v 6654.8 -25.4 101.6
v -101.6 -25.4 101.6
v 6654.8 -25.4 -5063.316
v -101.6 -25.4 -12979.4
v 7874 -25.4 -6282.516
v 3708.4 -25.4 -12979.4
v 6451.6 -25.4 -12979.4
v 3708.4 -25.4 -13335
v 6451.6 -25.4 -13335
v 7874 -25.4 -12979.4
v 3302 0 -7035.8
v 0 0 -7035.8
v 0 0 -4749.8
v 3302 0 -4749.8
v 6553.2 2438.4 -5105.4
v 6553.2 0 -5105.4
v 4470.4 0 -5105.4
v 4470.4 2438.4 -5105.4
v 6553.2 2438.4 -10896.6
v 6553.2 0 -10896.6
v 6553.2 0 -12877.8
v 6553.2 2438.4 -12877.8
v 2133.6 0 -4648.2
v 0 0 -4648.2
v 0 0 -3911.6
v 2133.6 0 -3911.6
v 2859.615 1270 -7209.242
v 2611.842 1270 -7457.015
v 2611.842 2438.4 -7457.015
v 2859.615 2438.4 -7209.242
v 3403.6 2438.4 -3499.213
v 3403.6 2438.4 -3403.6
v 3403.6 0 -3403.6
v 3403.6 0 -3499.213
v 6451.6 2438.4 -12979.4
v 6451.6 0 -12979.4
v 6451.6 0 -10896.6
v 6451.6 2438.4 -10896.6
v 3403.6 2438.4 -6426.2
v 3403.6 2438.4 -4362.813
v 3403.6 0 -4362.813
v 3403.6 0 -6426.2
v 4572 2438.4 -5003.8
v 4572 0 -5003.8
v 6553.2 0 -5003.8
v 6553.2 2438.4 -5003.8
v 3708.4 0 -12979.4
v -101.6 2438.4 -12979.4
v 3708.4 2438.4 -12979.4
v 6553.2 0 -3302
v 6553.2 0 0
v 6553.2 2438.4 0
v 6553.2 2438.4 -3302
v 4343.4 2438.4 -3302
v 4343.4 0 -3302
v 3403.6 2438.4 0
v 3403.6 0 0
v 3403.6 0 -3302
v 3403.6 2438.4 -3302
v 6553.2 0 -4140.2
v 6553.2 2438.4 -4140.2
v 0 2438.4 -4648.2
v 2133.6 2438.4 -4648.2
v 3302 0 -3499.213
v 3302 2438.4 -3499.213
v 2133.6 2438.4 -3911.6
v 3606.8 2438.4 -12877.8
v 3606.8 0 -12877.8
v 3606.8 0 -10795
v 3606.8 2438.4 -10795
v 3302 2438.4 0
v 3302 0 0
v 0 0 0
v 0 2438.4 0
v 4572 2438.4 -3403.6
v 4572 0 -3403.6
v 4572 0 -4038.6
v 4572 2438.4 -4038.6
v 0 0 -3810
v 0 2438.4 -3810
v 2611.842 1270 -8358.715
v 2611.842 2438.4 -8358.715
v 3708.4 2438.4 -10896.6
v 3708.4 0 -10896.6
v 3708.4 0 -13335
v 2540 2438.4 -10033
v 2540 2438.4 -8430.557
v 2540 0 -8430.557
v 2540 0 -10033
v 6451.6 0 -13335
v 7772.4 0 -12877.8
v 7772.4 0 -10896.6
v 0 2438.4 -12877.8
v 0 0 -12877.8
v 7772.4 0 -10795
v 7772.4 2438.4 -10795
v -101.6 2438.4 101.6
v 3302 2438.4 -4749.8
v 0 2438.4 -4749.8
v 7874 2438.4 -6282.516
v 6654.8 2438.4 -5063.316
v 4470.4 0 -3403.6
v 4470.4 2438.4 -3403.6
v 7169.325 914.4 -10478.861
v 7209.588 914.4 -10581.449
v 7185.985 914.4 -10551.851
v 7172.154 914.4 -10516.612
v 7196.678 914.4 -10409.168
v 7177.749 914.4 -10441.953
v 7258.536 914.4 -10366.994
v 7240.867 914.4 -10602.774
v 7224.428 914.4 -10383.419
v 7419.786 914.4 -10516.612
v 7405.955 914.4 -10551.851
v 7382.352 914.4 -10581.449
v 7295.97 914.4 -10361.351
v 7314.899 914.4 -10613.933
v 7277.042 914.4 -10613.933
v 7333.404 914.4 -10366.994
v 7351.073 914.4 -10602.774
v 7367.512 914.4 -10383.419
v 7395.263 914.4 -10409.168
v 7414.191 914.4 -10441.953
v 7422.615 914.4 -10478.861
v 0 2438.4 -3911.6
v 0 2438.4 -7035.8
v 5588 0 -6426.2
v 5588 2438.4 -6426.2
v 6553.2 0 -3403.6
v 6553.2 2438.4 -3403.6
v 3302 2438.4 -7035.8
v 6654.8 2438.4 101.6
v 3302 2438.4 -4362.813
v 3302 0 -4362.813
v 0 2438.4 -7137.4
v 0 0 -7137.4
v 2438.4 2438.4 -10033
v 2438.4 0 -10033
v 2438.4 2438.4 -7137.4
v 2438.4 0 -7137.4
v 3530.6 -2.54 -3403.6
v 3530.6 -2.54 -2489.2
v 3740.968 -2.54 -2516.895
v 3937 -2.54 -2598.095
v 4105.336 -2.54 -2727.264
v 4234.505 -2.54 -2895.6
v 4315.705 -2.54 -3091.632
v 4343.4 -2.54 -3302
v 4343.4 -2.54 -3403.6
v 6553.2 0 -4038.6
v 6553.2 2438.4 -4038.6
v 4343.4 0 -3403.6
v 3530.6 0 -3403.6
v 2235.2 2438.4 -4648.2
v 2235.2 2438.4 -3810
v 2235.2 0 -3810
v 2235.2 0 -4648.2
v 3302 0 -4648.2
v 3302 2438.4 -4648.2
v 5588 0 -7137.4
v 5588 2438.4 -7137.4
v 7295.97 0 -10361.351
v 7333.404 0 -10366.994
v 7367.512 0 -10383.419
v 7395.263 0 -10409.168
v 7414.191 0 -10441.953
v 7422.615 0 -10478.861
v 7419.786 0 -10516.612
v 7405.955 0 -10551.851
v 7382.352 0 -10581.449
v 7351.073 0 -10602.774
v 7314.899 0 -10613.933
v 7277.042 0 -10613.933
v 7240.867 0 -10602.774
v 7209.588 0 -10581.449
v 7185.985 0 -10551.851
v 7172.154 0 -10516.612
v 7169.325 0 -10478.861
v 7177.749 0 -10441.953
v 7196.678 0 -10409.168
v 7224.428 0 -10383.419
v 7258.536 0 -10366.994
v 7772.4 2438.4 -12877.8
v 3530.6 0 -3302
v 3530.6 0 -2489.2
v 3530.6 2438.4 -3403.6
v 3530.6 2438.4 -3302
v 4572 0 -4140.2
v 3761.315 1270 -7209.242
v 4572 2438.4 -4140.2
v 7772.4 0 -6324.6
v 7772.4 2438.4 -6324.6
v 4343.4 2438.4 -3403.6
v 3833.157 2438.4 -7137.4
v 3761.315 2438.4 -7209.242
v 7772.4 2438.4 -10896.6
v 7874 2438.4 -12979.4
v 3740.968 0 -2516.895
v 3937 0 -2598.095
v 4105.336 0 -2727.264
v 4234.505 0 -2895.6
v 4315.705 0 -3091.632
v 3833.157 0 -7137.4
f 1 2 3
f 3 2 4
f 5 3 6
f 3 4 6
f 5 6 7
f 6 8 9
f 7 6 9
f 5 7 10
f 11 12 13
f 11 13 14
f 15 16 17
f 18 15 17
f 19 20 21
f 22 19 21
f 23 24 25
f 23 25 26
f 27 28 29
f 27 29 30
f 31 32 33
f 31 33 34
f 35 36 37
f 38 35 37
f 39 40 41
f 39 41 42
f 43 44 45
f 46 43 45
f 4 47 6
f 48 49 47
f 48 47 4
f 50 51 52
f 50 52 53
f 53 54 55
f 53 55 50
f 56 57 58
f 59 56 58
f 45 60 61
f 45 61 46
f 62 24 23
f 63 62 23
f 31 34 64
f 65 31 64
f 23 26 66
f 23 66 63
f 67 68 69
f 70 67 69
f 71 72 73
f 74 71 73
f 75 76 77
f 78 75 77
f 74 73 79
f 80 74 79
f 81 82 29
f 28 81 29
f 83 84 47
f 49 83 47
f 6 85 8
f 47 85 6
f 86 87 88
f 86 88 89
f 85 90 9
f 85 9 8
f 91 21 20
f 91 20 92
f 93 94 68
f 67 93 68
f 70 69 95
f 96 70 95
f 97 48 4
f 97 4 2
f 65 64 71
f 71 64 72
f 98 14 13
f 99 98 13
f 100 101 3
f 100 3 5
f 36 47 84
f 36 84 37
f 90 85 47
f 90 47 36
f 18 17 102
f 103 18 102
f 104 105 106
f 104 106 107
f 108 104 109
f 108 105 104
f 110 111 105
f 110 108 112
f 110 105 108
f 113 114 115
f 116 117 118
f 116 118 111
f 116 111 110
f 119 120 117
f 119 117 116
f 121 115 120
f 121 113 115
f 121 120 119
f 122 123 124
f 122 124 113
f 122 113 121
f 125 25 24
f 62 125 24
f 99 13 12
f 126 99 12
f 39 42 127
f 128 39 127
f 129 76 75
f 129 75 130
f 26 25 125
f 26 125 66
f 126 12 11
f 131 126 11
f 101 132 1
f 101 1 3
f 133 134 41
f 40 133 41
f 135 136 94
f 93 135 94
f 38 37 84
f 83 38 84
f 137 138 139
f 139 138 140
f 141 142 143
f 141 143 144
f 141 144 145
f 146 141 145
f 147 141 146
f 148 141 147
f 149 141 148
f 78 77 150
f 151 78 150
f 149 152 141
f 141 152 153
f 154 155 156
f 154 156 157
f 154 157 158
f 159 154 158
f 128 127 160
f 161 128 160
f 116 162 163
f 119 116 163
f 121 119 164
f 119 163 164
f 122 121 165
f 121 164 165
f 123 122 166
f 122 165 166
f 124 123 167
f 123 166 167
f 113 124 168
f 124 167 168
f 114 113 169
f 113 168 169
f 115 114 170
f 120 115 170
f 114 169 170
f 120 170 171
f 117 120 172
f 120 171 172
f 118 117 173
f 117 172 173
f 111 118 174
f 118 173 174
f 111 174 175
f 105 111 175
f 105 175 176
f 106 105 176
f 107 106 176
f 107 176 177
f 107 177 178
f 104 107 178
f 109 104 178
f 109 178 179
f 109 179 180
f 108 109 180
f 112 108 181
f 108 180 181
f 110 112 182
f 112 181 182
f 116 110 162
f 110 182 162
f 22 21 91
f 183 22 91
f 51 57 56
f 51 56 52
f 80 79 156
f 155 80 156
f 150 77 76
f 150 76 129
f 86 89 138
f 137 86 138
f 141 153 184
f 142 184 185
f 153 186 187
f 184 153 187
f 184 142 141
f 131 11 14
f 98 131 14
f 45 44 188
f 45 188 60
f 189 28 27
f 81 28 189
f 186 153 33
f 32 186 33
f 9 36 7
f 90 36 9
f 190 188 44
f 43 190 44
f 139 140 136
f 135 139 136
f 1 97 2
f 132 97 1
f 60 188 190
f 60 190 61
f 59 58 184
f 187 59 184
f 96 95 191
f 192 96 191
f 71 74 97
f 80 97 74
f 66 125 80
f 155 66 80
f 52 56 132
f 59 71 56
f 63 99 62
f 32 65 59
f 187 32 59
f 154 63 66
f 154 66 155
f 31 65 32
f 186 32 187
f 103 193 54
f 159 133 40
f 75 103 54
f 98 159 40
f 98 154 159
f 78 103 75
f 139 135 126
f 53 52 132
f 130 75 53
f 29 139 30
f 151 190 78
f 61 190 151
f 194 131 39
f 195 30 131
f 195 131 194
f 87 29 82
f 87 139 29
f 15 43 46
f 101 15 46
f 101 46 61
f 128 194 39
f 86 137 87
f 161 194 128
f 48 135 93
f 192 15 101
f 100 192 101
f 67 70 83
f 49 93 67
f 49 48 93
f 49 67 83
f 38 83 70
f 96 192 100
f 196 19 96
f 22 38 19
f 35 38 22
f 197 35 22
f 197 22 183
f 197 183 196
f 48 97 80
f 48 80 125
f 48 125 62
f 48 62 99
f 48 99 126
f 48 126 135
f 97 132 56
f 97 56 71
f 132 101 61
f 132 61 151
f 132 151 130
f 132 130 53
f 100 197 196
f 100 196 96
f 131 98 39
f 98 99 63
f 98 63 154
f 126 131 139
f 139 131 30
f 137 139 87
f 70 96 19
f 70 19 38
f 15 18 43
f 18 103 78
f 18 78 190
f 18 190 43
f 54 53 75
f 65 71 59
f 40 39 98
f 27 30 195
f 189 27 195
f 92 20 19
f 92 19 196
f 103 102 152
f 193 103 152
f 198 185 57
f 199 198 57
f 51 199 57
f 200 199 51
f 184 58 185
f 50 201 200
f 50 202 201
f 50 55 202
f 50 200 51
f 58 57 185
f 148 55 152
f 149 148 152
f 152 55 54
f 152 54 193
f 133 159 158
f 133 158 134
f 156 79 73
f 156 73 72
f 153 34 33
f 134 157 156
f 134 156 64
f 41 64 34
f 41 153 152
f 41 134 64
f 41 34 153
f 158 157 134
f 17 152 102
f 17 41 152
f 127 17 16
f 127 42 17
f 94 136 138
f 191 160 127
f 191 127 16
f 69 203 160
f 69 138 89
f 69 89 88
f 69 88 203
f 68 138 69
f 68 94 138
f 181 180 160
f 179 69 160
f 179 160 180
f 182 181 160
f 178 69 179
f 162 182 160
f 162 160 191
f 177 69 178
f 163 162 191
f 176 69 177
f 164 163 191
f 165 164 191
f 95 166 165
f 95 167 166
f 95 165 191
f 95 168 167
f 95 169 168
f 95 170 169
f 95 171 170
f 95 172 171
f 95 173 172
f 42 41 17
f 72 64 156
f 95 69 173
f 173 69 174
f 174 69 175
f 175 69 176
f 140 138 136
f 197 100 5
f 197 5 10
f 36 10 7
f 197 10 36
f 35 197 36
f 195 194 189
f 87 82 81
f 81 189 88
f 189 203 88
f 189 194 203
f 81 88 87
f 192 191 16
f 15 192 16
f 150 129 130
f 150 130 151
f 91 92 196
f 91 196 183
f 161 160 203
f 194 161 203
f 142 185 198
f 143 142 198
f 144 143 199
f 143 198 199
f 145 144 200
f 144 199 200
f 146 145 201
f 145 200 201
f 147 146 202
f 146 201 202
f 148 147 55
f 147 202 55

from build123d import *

# Parameters (mm, degrees)
SKETCH1_W           = 3149.6
SKETCH1_H           = 3302
SKETCH1_W_2         = 1981.2
SKETCH1_H_2         = 635
SKETCH1_H_3         = 863.6
SKETCH1_W_3         = 2133.6
SKETCH1_H_4         = 736.6
SKETCH1_W_4         = 1219.2
SKETCH1_H_5         = 1981.2
BOSS_EXTRUDE2_DEPTH = 2438.4
BOSS_EXTRUDE3_DEPTH = 25.4
CUT_EXTRUDE1_DEPTH  = 2440.94
CUT_EXTRUDE2_DEPTH  = 1168.4
SKETCH4_R           = 127
BOSS_EXTRUDE4_DEPTH = 914.4


with BuildPart() as part:
    # Sketch1 → Boss-Extrude2 (new body)
    with BuildSketch(Plane(origin=(0, 0, 0), x_dir=(1, 0, 0), z_dir=(0, 1, 0))):
        Polygon((6451.6, 10896.6), (3708.4, 10896.6), (3708.4, 12979.4), (-101.6, 12979.4), (-101.6, -101.6), (6654.8, -101.6), (6654.8, 5063.315902063), (7874, 6282.515902063), (7874, 12979.4), (6451.6, 12979.4), align=None)
        Polygon((3833.156881434, 7137.4), (2540, 8430.556881434), (2540, 10033), (2438.4, 10033), (2438.4, 7137.4), (0, 7137.4), (0, 12877.8), (3606.8, 12877.8), (3606.8, 10795), (7772.4, 10795), (7772.4, 6324.6), (6553.2, 5105.4), (4470.4, 5105.4), (4470.4, 3403.6), (3403.6, 3403.6), (3403.6, 3499.213082822), (3302, 3499.213082822), (3302, 0), (0, 0), (0, 3810), (2235.2, 3810), (2235.2, 4648.2), (3302, 4648.2), (3302, 4362.813082822), (3403.6, 4362.813082822), (3403.6, 6426.2), (5588, 6426.2), (5588, 7137.4), align=None, mode=Mode.SUBTRACT)
        Polygon((3302, 6426.2), (3302, 4749.8), (0, 4749.8), (0, 7035.8), (3302, 7035.8), align=None, mode=Mode.SUBTRACT)
        with Locations((4978.4, 1651)):
            Rectangle(SKETCH1_W, SKETCH1_H, mode=Mode.SUBTRACT)
        with Locations((5562.6, 3721.1)):
            Rectangle(SKETCH1_W_2, SKETCH1_H_2, mode=Mode.SUBTRACT)
        with Locations((5562.6, 4572)):
            Rectangle(SKETCH1_W_2, SKETCH1_H_3, mode=Mode.SUBTRACT)
        with Locations((1066.8, 4279.9)):
            Rectangle(SKETCH1_W_3, SKETCH1_H_4, mode=Mode.SUBTRACT)
        with Locations((7162.8, 11887.2)):
            Rectangle(SKETCH1_W_4, SKETCH1_H_5, mode=Mode.SUBTRACT)
    extrude(amount=BOSS_EXTRUDE2_DEPTH)

    # Sketch1<5> → Boss-Extrude3 (add)
    with BuildSketch(Plane(origin=(0, 0, 0), x_dir=(1, 0, 0), z_dir=(0, 1, 0))):
        Polygon((3708.4, 12979.4), (-101.6, 12979.4), (-101.6, -101.6), (6654.8, -101.6), (6654.8, 5063.315902063), (7874, 6282.515902063), (7874, 12979.4), (6451.6, 12979.4), (6451.6, 13335), (3708.4, 13335), align=None)
    extrude(amount=-BOSS_EXTRUDE3_DEPTH)

    # Sketch2 → Cut-Extrude1 (cut)
    with BuildSketch(Plane(origin=(0, 2438.4, 0), x_dir=(1, 0, 0), z_dir=(0, 1, 0))):
        with BuildLine():
            Line((3530.6, 3403.6), (3530.6, 3302))
            Line((3530.6, 3302), (3530.6, 2489.2))
            ThreePointArc((3530.6, 2489.2), (4105.336391748, 2727.263608252), (4343.4, 3302))
            Line((4343.4, 3302), (4343.4, 3403.6))
            Line((4343.4, 3403.6), (3530.6, 3403.6))
        make_face()
    extrude(amount=-CUT_EXTRUDE1_DEPTH, mode=Mode.SUBTRACT)

    # Sketch3 → Cut-Extrude2 (cut)
    with BuildSketch(Plane(origin=(0, 2438.4, 0), x_dir=(1, 0, 0), z_dir=(0, 1, 0))):
        Polygon((2611.842048969, 8358.714832465), (2611.842048969, 7457.014832465), (2859.614832465, 7209.242048969), (3761.314832465, 7209.242048969), align=None)
    extrude(amount=-CUT_EXTRUDE2_DEPTH, mode=Mode.SUBTRACT)

    # Sketch4 → Boss-Extrude4 (add)
    with BuildSketch(Plane(origin=(0, 0, 0), x_dir=(1, 0, 0), z_dir=(0, 1, 0))):
        with Locations(Location((7295.970143414, 10488.35135806, 0), (0, 0, 270))):
            Circle(SKETCH4_R)
    extrude(amount=BOSS_EXTRUDE4_DEPTH)


solid = part.part
